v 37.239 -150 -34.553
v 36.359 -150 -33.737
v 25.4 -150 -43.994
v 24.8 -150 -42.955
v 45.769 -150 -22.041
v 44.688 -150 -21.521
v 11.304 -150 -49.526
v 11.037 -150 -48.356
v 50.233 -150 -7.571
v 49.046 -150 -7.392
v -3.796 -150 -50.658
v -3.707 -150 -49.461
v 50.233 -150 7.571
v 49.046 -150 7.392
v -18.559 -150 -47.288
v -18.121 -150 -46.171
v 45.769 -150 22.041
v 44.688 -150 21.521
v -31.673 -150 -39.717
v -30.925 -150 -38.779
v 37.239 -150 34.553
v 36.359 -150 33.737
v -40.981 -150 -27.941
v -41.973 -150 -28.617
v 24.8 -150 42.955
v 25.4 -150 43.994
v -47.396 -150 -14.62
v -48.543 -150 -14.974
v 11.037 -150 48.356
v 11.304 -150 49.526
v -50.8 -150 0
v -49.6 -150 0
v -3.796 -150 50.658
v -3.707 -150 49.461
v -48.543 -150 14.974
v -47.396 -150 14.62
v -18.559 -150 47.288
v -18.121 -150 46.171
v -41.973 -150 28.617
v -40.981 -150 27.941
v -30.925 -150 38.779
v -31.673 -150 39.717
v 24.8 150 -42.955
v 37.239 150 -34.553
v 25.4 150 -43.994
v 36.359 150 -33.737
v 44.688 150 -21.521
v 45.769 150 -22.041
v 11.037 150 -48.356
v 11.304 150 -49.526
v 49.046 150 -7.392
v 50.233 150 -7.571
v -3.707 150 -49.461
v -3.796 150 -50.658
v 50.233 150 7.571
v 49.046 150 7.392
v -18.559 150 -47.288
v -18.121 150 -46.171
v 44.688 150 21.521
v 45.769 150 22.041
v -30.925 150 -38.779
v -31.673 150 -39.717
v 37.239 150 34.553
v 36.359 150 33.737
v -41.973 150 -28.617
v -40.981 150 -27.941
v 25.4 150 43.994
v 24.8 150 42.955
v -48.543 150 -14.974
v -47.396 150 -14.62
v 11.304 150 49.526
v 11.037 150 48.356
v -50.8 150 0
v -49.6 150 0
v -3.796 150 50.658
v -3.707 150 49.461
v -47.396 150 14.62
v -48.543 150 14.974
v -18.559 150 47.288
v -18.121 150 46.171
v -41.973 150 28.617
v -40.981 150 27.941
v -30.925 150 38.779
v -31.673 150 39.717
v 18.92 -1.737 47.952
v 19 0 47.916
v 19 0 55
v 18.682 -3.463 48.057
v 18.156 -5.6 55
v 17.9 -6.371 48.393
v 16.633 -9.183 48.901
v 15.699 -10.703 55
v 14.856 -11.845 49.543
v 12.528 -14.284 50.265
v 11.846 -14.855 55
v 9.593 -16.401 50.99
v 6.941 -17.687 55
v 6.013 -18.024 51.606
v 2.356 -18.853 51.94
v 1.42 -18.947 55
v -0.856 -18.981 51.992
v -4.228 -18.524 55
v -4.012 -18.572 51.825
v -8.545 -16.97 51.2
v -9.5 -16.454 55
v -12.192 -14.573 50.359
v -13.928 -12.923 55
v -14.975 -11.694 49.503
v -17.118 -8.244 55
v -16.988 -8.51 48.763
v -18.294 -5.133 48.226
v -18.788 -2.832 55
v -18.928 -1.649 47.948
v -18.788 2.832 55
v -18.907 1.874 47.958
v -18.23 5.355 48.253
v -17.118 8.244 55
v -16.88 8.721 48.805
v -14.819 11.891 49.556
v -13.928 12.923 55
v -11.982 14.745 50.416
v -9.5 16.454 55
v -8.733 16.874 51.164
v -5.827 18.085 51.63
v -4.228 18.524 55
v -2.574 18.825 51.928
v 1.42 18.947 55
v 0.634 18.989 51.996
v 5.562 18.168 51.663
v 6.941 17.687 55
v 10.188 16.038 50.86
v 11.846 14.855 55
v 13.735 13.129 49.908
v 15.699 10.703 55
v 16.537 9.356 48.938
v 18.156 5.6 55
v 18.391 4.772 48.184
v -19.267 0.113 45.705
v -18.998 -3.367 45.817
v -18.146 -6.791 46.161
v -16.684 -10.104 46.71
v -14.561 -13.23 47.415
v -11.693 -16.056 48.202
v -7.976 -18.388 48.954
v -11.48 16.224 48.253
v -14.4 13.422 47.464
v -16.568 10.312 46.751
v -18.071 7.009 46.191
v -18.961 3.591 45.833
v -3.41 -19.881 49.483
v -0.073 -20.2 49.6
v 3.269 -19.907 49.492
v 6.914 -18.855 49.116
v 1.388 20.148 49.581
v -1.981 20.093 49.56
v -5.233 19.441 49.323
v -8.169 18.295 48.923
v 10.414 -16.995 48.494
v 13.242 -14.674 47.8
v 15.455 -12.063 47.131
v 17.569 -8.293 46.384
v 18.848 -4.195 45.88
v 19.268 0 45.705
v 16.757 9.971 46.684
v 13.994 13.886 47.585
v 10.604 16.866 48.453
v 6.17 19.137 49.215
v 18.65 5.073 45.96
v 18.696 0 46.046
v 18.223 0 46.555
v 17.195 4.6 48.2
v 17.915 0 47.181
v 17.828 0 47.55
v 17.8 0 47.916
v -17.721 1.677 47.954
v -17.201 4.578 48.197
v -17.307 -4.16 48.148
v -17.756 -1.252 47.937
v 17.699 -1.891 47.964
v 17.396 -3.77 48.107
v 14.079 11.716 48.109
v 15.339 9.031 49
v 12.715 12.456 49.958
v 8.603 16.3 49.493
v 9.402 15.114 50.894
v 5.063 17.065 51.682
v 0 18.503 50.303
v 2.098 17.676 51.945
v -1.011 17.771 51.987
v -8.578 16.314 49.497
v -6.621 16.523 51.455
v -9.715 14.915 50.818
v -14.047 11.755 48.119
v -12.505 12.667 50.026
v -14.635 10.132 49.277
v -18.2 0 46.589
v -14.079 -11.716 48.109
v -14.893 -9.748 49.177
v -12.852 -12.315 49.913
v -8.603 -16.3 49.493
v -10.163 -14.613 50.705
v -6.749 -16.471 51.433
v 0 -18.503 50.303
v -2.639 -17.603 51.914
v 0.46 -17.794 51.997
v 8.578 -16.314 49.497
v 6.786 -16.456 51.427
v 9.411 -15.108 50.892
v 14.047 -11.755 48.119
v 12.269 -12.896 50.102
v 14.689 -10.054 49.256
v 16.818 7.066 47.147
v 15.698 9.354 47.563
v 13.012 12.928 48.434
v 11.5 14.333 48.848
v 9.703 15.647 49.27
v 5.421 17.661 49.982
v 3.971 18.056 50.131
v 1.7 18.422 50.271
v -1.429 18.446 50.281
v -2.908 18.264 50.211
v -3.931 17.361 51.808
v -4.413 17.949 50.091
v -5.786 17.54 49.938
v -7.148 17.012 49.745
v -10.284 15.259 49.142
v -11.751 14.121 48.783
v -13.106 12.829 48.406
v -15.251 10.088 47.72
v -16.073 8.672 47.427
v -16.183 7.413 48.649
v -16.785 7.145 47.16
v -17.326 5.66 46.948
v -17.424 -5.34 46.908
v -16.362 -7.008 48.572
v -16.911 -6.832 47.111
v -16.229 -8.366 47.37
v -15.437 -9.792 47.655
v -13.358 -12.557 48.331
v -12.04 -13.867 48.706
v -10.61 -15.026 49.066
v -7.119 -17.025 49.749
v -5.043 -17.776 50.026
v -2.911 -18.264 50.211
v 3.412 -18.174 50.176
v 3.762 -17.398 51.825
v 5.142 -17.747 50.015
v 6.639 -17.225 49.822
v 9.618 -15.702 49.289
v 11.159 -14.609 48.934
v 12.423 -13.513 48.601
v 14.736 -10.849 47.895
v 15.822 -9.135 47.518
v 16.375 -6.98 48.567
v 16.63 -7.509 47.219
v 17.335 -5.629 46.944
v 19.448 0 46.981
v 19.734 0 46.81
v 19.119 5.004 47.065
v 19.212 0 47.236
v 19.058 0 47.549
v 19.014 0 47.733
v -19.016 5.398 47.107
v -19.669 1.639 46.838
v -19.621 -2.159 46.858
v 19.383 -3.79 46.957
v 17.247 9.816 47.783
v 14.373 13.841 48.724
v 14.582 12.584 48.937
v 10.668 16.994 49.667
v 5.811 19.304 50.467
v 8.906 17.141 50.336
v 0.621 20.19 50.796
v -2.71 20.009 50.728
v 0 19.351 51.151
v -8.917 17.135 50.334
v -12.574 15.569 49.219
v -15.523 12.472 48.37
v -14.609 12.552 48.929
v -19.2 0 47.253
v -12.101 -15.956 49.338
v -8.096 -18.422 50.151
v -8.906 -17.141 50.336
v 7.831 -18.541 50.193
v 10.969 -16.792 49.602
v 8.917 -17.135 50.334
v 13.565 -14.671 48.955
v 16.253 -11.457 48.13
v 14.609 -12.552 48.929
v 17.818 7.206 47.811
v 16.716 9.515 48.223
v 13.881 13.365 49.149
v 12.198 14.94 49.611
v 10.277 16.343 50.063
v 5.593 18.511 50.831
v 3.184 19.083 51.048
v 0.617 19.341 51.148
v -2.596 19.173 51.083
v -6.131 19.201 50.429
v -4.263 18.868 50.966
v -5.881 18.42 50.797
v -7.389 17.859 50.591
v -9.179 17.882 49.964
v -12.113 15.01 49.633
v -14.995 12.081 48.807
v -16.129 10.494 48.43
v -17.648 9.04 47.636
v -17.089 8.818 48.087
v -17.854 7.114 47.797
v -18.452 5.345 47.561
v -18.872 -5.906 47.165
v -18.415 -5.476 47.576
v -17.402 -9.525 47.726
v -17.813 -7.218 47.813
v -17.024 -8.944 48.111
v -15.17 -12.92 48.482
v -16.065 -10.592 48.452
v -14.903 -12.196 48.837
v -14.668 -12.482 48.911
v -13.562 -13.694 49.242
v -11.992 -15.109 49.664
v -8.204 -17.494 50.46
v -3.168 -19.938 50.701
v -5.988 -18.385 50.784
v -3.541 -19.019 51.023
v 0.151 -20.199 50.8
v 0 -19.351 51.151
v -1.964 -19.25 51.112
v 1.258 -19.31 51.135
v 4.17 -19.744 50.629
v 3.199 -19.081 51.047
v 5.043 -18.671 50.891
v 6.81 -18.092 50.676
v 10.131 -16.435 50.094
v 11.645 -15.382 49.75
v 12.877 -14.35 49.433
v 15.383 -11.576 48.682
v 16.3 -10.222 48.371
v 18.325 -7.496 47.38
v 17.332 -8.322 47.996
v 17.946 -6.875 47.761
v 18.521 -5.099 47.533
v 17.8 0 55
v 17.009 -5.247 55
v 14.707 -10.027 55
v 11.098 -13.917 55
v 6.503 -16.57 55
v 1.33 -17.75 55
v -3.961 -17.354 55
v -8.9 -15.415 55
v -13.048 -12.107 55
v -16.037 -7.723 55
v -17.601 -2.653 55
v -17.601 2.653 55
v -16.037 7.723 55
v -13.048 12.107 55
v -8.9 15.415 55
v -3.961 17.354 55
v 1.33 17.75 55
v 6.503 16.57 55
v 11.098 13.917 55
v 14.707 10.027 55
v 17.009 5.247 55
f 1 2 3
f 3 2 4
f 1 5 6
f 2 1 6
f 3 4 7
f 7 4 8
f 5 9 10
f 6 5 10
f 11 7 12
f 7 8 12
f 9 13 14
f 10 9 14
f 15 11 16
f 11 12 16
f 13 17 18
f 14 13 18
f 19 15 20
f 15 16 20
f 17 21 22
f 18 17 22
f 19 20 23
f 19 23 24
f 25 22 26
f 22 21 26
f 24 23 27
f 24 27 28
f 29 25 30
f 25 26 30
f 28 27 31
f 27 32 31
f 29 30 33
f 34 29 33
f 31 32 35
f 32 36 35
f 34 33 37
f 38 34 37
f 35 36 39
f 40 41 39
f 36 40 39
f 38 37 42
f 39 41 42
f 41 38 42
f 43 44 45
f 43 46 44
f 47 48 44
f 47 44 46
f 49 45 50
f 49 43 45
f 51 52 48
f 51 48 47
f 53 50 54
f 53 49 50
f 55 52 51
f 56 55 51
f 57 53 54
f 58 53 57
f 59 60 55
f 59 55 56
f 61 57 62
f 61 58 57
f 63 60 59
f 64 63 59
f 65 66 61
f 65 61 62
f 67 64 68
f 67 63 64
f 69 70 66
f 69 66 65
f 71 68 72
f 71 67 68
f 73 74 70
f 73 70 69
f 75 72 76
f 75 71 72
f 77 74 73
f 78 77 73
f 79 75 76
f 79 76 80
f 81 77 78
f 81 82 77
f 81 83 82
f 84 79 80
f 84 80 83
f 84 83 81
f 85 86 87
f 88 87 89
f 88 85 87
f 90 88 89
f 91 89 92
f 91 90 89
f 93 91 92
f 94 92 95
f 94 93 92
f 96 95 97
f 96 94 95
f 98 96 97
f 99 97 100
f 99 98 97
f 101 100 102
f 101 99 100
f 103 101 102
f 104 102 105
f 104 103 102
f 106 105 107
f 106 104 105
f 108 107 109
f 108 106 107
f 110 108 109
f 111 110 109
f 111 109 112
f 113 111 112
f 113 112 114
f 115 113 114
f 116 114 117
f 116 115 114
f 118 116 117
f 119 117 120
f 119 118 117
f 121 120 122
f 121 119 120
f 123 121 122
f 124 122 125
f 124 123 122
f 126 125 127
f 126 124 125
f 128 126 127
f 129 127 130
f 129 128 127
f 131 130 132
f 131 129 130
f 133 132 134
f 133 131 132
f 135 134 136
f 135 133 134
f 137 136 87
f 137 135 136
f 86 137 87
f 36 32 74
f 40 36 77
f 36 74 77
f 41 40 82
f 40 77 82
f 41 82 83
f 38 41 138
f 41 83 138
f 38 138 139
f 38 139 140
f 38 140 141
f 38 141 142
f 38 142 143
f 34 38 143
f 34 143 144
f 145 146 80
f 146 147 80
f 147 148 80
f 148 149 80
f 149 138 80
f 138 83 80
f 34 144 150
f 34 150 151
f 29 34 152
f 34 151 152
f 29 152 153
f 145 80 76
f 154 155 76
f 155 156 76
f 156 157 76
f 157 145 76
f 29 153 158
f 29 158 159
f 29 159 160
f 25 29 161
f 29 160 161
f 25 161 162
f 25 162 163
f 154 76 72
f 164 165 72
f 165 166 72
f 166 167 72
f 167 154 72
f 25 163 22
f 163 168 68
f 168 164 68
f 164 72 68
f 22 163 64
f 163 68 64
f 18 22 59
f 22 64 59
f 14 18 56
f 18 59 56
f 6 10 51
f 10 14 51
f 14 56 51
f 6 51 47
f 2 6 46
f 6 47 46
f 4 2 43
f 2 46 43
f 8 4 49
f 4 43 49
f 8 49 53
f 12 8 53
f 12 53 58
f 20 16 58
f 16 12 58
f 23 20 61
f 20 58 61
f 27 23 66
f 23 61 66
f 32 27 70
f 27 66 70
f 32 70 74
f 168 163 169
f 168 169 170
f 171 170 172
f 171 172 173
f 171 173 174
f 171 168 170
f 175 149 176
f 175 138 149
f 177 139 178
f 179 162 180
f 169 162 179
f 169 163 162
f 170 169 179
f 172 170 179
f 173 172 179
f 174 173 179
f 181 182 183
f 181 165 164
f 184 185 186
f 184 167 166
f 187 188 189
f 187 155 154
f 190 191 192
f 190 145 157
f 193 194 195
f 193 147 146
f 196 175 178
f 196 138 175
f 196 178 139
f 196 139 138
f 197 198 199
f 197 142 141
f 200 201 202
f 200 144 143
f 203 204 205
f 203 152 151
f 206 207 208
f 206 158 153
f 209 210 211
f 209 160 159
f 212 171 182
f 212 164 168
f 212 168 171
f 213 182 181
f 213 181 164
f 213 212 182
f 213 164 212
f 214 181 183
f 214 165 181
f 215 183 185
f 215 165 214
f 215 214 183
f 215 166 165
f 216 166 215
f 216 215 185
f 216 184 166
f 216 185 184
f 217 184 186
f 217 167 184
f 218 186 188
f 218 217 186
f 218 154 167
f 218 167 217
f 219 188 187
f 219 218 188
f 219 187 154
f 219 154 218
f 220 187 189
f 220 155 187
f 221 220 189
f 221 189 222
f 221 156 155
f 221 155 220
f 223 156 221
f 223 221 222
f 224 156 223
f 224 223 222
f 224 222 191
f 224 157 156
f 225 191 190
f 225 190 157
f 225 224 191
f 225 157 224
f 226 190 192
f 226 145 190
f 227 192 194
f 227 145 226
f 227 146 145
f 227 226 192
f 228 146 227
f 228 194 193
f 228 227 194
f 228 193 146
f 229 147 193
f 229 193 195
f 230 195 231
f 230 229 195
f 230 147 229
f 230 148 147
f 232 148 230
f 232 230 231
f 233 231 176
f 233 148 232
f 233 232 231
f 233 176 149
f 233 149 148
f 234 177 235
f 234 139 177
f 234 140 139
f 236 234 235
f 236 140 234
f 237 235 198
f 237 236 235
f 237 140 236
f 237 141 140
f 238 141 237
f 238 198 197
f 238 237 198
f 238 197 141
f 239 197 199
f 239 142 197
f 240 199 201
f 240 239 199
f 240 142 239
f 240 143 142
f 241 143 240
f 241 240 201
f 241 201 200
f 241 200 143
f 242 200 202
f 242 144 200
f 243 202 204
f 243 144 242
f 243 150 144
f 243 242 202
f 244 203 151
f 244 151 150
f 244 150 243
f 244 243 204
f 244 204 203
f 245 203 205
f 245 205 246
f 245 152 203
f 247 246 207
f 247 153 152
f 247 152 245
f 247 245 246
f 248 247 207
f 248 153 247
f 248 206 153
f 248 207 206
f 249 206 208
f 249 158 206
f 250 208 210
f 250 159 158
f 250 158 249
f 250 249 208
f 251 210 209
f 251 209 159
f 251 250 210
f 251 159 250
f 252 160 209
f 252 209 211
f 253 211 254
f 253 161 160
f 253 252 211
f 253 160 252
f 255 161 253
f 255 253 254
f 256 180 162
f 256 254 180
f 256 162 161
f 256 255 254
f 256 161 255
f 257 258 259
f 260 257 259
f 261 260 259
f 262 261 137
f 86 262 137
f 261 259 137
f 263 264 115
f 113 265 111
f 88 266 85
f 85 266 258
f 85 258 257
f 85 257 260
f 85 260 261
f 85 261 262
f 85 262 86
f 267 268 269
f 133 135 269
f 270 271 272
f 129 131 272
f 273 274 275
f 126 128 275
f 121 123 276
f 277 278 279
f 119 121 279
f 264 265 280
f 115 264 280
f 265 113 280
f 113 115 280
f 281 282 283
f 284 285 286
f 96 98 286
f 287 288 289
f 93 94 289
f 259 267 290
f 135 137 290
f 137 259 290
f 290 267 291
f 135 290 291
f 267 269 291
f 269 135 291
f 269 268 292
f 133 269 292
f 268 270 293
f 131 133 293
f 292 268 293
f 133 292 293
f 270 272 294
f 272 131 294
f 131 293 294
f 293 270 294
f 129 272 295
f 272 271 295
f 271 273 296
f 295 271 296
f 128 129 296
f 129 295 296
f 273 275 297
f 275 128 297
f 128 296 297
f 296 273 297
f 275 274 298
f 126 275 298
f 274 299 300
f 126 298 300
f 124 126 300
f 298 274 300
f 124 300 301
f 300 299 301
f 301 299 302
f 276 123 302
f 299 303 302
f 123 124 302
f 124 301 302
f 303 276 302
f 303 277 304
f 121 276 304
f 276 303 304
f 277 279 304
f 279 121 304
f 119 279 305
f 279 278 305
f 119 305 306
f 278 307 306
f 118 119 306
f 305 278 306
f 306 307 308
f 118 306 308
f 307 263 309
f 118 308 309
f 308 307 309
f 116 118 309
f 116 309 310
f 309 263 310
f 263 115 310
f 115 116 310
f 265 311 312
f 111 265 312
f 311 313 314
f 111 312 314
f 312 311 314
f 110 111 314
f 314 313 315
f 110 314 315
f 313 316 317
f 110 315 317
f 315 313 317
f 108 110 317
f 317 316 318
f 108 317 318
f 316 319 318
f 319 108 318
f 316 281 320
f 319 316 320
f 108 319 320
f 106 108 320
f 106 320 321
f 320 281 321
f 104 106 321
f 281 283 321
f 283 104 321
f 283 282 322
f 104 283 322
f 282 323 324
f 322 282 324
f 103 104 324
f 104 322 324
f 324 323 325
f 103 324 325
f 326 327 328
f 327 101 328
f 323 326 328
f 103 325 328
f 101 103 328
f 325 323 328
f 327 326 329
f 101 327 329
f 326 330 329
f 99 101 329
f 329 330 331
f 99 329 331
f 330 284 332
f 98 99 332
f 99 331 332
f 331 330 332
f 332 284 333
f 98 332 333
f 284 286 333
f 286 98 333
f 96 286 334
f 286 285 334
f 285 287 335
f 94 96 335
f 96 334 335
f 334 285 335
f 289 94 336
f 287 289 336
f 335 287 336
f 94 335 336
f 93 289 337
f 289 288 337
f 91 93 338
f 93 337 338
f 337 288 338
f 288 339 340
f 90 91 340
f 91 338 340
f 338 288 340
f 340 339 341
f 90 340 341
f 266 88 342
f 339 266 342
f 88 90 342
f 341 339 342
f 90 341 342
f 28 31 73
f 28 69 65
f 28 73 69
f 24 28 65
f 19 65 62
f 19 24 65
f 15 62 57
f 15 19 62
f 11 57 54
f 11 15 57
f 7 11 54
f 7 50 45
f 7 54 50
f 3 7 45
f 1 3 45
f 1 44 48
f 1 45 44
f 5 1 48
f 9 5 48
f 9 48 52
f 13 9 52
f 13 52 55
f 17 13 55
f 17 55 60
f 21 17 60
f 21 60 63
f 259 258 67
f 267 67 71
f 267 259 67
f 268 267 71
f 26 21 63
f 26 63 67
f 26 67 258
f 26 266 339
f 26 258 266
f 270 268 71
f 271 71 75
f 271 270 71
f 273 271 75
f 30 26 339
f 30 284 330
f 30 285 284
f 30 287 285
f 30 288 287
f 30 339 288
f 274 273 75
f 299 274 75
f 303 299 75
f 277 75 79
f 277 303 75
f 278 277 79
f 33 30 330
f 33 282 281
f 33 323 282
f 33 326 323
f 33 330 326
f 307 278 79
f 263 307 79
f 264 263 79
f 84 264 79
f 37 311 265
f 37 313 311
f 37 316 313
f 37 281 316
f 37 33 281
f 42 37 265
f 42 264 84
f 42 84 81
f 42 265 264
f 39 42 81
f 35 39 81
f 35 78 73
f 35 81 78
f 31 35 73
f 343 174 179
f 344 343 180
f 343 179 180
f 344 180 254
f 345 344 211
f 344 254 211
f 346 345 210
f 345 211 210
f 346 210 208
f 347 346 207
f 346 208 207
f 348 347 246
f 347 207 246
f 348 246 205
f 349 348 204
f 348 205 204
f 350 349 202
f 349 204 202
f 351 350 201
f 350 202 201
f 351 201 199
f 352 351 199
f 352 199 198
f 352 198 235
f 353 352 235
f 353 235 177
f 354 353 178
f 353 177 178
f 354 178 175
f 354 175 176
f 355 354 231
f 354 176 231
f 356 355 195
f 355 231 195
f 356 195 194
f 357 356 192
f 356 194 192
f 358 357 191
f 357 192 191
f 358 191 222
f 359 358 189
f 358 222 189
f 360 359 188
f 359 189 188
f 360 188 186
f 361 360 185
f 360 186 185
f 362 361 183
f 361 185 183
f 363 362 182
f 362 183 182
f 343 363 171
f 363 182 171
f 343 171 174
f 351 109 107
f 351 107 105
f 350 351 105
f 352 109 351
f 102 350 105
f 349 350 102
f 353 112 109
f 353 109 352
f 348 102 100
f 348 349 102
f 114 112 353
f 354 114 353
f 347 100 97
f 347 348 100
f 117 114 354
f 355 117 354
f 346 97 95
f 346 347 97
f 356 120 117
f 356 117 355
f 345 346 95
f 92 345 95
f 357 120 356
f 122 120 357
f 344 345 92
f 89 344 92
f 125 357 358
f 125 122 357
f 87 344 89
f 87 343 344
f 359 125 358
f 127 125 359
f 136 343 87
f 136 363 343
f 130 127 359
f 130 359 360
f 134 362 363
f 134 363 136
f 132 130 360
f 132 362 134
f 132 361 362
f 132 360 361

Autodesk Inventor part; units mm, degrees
ref_plane "YZ Plane" through (0, 0, 0) normal (1, 0, 0) x (0, 1, 0)
ref_plane "XZ Plane" through (0, 0, 0) normal (0, 1, 0) x (-1, 0, 0)
ref_plane "XY Plane" through (0, 0, 0) normal (0, 0, 1) x (1, 0, 0)
sketch "Szkic8" plane through (0, 0, 0) normal (0, 1, 0) x (-1, 0, 0)
  circle A0 centre (0, 0) radius 50.8
  circle A1 centre (0, 0) radius 49.6
  dimension "d53" = 101.6
  dimension "d54" = 1.2
extrude "Wyciągnięcie proste2" add sketch "Szkic8" along normal mid plane 300
sketch "Szkic13" plane through (0, 0, 0) normal (0, 0, 1) x (1, 0, 0)
  circle A0 centre (0, 0) radius 19
  circle A1 centre (0, 0) radius 17.8
  dimension "d67" = 38
  dimension "d68" = 1.2
extrude "Wyciągnięcie proste6" add sketch "Szkic13" along normal blind 55
sketch "Szkic14" plane through (0, 0, 55) normal (0, 0, 1) x (1, 0, 0)
  circle A0 centre (0, 0) radius 17.8 projected
extrude "Wyciągnięcie proste7" cut sketch "Szkic14" against normal blind 55
sketch "Szkic15" plane through (0, -150, 0) normal (0, -1, 0) x (1, 0, 0)
  circle A0 centre (0, 0) radius 49.6 projected
extrude "Wyciągnięcie proste8" cut sketch "Szkic15" against normal blind 300
fillet "Zaokrąglenie3" radius 1.2 2 edges at (-0.0019, 19, 50.8) (-0.0001, -19, 50.8)
fillet "Zaokrąglenie4" radius 2.4 2 edges at (-0.0005, -17.8, 49.6) (-0.001, 17.8, 49.6)
equation "\"d53\" = OD"
equation "\"d54\" = THK"
equation "\"d55\" = L1"
equation "\"d67\" = OD2"
equation "\"d68\" = THK"
equation "\"d69\" = L2"
equation "\"d71\" = L2"
equation "\"d73\" = L1"
equation "\"d75\" = THK"
equation "\"d76\" = 2 * THK"
equation "\"SzerokośćGięciaPodcięcia\" = Grubość"
equation "\"RozmiarPodcięciaNarożnika\" = 4 * Grubość"
equation "\"PromieńPrzejścia\" = PromieńGięcia"
equation "\"Rozmiar_promienia_Jacobiego\" = PromieńGięcia"
equation "\"Wielk_odstępu\" = Grubość"
equation "\"d2\" = PromieńGięcia"
equation "\"d23\" = PromieńGięcia"
equation "\"OD\" = 101.6"
equation "\"THK\" = 1.2"
equation "\"L1\" = 300"
equation "\"L2\" = 55"
equation "\"OD2\" = 38"
equation "\"Grubość\" = 1.5"
equation "\"PromieńGięcia\" = 3"
properties part number "Trójnik red. krótki  Ø101,6 38 101,6 s=1,2 L=300" material "304"
